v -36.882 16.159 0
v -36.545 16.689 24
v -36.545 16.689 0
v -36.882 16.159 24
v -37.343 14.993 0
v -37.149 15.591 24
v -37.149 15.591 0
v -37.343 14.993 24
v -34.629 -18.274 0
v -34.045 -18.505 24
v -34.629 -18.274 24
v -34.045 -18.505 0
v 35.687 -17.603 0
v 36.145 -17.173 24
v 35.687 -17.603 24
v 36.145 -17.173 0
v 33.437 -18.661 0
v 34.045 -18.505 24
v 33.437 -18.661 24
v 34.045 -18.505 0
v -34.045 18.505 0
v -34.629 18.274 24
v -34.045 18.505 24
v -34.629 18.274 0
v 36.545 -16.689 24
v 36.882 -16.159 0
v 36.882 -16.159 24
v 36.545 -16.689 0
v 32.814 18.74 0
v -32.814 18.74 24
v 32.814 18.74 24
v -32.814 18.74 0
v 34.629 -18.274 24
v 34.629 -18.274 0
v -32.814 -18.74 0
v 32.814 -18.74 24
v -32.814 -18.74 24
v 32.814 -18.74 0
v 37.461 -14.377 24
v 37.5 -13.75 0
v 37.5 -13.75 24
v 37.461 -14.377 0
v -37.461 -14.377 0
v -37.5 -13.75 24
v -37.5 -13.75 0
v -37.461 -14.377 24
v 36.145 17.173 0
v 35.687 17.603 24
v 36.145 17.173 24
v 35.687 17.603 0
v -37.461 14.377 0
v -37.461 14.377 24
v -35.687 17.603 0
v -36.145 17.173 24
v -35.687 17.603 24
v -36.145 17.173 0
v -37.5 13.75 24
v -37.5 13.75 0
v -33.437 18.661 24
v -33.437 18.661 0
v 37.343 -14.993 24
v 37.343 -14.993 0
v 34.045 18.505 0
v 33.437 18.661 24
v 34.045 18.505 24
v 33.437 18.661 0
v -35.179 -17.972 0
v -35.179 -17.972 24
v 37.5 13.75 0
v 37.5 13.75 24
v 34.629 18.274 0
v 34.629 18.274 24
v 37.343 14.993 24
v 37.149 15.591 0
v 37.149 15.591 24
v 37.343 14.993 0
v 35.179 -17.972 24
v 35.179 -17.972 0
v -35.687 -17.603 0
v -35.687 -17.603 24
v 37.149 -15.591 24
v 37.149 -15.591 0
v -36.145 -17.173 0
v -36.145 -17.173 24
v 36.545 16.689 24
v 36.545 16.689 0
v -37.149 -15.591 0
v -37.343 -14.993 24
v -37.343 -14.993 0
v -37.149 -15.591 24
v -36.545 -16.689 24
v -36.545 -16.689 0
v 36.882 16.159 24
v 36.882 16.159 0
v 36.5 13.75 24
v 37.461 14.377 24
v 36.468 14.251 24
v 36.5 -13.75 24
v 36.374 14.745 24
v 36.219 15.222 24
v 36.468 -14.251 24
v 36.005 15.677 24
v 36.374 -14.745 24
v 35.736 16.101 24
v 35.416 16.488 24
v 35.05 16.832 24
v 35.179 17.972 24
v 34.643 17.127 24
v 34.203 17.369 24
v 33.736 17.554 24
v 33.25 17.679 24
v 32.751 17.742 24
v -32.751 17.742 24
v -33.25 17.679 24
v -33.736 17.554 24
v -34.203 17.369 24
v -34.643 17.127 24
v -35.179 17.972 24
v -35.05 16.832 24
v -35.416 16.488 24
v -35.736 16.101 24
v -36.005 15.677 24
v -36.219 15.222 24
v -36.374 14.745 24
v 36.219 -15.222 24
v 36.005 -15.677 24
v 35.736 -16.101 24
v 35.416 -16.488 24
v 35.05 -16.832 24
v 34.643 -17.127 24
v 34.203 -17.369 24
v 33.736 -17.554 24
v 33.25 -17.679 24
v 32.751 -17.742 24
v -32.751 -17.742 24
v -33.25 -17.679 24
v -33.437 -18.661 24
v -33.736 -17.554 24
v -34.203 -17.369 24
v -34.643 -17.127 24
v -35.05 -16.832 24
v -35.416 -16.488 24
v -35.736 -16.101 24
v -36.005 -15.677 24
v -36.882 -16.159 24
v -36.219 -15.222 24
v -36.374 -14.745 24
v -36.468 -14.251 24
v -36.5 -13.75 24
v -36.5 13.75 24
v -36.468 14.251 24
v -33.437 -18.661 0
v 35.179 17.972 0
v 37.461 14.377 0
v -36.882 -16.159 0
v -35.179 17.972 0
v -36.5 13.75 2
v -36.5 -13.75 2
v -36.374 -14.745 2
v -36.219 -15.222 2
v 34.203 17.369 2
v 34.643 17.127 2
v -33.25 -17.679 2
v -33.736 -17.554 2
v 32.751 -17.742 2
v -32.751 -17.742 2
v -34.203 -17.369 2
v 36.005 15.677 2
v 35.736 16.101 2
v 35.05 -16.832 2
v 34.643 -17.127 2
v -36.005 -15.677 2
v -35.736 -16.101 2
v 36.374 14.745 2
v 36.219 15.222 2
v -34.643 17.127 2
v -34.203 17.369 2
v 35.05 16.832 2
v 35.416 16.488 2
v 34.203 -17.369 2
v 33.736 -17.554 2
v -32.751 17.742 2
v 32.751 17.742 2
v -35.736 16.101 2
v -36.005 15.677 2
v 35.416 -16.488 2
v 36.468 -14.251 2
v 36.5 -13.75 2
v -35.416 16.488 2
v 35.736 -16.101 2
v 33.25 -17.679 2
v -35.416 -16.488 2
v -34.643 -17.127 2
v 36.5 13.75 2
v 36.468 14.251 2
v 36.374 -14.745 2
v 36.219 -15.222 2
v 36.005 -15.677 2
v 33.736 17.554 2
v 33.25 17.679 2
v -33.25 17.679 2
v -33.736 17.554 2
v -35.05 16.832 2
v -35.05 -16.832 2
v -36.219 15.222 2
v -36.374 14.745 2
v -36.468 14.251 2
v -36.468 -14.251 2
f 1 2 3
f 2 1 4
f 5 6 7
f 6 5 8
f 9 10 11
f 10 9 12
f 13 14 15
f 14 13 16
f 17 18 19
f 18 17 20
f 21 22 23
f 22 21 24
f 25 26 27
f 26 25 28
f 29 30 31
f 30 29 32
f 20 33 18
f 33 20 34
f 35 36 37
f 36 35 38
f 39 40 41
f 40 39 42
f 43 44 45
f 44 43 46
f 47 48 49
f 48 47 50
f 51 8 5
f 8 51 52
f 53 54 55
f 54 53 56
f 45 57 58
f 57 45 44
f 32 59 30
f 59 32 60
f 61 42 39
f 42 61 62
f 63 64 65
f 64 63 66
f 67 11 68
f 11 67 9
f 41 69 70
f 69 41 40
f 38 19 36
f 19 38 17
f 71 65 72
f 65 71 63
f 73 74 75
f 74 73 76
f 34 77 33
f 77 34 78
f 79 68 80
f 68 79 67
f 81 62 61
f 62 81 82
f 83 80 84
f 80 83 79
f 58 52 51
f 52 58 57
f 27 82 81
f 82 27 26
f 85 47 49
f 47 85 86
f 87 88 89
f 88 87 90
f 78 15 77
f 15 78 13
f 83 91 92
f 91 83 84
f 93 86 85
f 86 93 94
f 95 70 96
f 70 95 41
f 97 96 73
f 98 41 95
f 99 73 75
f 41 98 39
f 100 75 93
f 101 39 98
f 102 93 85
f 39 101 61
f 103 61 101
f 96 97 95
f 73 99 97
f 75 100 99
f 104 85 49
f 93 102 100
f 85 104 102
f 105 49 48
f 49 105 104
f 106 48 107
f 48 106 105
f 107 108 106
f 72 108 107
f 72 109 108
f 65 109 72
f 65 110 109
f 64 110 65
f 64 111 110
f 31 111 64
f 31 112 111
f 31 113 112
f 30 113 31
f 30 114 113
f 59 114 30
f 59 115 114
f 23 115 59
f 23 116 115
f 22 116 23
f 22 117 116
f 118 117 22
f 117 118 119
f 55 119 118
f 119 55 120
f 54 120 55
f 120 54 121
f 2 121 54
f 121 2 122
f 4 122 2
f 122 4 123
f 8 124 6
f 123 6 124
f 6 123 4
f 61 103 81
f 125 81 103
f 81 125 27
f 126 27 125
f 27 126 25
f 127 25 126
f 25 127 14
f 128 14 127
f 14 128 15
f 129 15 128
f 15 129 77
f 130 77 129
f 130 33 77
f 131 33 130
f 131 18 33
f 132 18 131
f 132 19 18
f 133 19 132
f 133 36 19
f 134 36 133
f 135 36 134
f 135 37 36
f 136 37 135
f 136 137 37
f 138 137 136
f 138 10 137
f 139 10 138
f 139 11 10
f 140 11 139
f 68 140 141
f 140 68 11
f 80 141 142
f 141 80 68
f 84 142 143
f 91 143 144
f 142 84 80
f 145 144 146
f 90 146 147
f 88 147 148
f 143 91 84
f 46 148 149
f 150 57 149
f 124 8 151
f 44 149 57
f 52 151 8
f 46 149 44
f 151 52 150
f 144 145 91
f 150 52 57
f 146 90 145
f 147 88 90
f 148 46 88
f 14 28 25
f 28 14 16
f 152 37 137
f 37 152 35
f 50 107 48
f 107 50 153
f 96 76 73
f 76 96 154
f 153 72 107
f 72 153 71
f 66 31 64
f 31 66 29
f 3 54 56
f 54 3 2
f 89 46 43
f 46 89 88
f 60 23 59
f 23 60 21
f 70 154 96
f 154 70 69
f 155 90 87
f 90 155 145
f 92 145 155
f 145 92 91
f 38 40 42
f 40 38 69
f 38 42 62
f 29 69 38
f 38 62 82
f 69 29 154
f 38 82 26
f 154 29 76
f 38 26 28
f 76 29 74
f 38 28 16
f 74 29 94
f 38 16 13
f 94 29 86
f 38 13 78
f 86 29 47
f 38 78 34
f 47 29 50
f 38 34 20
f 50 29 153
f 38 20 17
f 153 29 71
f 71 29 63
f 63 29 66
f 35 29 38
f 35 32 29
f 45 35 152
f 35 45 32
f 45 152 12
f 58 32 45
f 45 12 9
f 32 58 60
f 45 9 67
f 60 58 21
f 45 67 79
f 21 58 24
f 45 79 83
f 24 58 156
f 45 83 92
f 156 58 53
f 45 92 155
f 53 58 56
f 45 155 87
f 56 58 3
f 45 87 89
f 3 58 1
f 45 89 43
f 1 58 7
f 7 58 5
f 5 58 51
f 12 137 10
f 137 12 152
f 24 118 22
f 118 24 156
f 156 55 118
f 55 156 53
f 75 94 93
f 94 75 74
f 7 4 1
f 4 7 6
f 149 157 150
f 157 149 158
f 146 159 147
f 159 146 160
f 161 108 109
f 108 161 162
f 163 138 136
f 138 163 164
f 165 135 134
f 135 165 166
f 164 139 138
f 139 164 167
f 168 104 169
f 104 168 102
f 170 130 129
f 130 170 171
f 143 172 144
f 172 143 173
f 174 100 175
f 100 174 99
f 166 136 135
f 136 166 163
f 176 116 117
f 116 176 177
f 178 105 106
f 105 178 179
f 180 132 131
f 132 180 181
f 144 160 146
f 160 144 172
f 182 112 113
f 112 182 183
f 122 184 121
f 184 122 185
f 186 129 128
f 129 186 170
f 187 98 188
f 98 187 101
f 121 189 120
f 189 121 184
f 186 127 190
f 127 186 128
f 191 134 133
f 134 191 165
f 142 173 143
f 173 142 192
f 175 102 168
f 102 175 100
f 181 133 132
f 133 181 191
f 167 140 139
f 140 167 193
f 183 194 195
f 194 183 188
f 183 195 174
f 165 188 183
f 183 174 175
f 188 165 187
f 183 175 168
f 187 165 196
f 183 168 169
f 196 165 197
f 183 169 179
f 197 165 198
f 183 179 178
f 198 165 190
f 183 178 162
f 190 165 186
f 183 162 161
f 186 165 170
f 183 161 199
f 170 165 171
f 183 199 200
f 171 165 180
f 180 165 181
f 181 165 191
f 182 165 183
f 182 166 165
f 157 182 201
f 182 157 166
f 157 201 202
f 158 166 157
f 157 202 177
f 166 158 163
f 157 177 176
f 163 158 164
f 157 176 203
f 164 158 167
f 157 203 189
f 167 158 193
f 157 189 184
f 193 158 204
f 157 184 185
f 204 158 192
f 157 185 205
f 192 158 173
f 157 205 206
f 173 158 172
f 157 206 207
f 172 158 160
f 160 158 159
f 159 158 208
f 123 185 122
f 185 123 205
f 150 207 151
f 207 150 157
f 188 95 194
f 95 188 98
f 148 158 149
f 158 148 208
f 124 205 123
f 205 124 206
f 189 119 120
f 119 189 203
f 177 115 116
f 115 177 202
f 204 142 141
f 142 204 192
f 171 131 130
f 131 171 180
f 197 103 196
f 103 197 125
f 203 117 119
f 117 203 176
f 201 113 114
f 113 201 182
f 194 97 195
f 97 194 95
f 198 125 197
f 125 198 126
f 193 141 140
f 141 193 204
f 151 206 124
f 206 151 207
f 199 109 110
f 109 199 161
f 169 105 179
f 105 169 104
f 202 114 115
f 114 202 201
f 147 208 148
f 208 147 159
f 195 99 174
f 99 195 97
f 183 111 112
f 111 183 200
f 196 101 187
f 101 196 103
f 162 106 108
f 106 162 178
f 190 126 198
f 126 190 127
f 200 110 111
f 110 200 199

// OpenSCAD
$fn = 50;


difference() {
	union() {
		hull() {
			translate(v = [-32.5000000000, 13.7500000000, 0]) {
				cylinder(h = 24, r = 5);
			}
			translate(v = [32.5000000000, 13.7500000000, 0]) {
				cylinder(h = 24, r = 5);
			}
			translate(v = [-32.5000000000, -13.7500000000, 0]) {
				cylinder(h = 24, r = 5);
			}
			translate(v = [32.5000000000, -13.7500000000, 0]) {
				cylinder(h = 24, r = 5);
			}
		}
	}
	union() {
		translate(v = [0, 0, 2]) {
			hull() {
				translate(v = [-32.5000000000, 13.7500000000, 0]) {
					cylinder(h = 22, r = 4);
				}
				translate(v = [32.5000000000, 13.7500000000, 0]) {
					cylinder(h = 22, r = 4);
				}
				translate(v = [-32.5000000000, -13.7500000000, 0]) {
					cylinder(h = 22, r = 4);
				}
				translate(v = [32.5000000000, -13.7500000000, 0]) {
					cylinder(h = 22, r = 4);
				}
			}
		}
	}
}
